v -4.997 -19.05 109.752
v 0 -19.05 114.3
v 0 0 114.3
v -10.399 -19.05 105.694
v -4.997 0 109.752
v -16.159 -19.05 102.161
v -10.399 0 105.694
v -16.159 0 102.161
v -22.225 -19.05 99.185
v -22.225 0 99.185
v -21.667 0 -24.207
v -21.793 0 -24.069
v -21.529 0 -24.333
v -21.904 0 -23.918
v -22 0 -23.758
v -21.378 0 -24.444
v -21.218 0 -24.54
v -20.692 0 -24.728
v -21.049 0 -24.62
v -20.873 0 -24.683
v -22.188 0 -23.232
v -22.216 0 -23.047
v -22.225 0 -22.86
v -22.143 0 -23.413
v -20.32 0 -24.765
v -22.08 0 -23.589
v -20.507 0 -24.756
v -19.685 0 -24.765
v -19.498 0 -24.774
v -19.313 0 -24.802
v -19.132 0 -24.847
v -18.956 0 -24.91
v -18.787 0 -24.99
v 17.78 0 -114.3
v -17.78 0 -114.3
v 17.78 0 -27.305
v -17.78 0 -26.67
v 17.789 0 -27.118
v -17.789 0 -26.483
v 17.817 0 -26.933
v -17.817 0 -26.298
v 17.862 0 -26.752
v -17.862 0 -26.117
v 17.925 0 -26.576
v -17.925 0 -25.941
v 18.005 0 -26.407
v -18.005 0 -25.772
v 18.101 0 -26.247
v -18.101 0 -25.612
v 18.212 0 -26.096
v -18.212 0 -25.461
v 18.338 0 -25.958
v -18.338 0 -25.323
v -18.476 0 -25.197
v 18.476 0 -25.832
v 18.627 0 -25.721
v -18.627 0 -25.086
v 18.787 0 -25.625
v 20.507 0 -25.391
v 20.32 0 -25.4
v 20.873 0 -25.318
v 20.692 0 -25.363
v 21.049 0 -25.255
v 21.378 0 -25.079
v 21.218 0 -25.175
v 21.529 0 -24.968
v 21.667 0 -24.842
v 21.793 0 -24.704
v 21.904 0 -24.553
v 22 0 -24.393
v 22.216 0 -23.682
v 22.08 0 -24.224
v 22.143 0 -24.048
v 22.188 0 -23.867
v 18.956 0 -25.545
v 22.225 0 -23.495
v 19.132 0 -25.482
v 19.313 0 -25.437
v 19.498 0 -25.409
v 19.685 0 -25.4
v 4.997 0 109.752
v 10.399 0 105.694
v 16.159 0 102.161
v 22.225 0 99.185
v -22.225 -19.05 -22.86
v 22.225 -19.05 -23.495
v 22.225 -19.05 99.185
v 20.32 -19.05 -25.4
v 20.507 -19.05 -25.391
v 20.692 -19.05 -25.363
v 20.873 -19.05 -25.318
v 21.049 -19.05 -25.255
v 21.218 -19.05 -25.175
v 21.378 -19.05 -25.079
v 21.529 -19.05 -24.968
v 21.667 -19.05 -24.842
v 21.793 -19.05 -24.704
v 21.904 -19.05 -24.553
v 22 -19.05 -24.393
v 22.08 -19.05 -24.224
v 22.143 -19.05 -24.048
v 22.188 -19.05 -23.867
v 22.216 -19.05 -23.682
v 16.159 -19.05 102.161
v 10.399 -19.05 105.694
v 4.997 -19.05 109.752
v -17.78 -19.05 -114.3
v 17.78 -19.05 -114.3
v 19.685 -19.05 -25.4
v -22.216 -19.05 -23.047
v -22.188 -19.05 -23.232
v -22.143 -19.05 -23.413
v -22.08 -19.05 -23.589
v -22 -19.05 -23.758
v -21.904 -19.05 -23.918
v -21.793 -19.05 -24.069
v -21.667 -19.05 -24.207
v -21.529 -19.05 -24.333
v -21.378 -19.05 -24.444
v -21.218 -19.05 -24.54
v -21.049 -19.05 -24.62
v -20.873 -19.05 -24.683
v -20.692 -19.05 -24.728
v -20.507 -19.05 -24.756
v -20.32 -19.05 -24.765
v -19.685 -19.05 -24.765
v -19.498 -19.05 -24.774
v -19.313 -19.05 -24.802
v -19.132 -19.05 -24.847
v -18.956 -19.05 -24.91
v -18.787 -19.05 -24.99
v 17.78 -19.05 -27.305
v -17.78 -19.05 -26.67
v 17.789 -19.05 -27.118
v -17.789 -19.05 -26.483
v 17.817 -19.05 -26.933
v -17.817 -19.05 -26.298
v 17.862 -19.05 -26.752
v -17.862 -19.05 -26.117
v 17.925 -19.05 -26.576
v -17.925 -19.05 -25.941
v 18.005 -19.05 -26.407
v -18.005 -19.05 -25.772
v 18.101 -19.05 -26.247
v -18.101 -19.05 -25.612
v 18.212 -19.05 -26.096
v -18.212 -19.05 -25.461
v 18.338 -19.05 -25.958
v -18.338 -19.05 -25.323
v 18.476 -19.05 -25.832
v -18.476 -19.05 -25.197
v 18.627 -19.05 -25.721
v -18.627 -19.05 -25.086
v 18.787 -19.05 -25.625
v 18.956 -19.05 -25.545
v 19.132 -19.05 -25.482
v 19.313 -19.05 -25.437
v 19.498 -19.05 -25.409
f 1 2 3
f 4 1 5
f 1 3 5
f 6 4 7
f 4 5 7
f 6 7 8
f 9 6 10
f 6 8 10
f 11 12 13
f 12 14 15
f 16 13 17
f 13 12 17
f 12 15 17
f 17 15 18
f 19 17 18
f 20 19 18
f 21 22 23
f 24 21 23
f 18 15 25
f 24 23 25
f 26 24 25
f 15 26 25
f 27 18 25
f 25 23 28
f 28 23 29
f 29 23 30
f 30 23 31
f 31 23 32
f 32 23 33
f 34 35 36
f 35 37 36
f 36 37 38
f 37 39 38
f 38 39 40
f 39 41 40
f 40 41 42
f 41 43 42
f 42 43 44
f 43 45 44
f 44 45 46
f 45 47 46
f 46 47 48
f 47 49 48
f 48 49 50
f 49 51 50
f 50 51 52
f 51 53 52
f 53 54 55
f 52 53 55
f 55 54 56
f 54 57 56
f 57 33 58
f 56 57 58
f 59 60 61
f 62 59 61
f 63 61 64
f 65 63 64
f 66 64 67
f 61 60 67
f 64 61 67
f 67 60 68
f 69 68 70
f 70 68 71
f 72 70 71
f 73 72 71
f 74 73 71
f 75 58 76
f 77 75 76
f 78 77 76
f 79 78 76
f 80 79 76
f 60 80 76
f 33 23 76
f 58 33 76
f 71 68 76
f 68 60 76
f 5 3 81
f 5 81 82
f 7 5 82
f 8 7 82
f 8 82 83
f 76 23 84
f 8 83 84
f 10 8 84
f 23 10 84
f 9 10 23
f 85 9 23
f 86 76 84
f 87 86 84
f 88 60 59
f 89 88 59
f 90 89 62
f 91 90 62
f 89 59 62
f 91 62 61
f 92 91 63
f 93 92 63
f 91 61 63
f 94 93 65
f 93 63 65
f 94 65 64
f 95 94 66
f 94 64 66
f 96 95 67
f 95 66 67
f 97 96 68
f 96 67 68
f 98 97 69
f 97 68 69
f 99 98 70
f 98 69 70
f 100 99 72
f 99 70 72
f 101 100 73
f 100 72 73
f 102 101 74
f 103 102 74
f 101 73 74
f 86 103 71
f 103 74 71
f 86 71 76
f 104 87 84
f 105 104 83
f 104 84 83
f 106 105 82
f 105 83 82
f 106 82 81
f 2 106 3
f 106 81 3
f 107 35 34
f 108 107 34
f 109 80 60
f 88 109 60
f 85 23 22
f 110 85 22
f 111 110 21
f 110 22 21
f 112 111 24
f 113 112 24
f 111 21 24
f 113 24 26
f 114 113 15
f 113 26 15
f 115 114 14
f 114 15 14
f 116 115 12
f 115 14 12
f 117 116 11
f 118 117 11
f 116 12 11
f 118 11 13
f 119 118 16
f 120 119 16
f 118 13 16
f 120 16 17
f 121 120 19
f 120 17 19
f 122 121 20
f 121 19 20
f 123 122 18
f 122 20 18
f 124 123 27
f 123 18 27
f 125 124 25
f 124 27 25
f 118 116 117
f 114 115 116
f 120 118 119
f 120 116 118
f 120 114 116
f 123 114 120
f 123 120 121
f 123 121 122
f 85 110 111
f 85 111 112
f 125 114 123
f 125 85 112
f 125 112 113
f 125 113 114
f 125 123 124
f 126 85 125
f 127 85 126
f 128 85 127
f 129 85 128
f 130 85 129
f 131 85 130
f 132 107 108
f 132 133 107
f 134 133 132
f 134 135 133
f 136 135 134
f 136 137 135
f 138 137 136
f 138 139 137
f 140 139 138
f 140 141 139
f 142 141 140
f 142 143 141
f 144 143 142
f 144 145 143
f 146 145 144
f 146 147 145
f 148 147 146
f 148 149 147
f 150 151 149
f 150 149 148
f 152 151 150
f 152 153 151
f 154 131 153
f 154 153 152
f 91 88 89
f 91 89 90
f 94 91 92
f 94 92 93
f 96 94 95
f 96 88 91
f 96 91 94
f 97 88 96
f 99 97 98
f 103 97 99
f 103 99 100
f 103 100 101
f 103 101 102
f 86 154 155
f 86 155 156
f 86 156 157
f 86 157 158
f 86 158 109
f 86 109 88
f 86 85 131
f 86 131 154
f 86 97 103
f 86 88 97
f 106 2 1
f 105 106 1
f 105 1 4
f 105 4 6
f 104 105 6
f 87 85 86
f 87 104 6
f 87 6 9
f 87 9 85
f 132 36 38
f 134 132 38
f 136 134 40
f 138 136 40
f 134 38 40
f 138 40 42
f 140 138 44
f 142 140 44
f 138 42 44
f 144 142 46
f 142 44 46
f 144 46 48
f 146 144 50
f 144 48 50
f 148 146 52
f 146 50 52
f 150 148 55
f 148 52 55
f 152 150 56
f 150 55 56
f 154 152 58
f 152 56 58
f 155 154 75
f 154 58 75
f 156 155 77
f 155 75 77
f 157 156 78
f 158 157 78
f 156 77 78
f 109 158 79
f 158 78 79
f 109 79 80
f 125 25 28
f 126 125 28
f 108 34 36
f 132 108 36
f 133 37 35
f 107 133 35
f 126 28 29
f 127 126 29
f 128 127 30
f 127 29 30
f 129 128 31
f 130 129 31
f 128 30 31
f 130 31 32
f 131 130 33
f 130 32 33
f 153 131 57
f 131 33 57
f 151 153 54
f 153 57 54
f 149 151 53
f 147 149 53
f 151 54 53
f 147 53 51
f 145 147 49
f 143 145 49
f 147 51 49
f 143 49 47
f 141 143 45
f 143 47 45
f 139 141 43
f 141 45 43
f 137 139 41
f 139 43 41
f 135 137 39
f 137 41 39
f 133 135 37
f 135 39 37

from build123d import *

# Parameters (mm, degrees)
F1_DEPTH = 19.05


with BuildPart() as f1:
    # F0 (on Front) → F1 (new body)
    with BuildSketch(Plane.XZ):
        with BuildLine():
            Line((-17.78, -114.3), (17.78, -114.3))
            Line((17.78, -114.3), (17.78, -27.305))
            ThreePointArc((17.78, -27.305), (18.337962, -25.957962), (19.685, -25.4))
            Line((19.685, -25.4), (20.32, -25.4))
            ThreePointArc((20.32, -25.4), (21.667038, -24.842038), (22.225, -23.495))
            Line((22.225, -23.495), (22.225, 99.185287))
            ThreePointArc((22.225, 99.185287), (10.399365, 105.694035), (0, 114.3))
            ThreePointArc((0, 114.3), (-10.399365, 105.694035), (-22.225, 99.185287))
            Line((-22.225, 99.185287), (-22.225, -22.86))
            ThreePointArc((-22.225, -22.86), (-21.667038, -24.207038), (-20.32, -24.765))
            Line((-20.32, -24.765), (-19.685, -24.765))
            ThreePointArc((-19.685, -24.765), (-18.337962, -25.322962), (-17.78, -26.67))
            Line((-17.78, -26.67), (-17.78, -114.3))
        make_face()
    extrude(amount=F1_DEPTH)


solid = f1.part
